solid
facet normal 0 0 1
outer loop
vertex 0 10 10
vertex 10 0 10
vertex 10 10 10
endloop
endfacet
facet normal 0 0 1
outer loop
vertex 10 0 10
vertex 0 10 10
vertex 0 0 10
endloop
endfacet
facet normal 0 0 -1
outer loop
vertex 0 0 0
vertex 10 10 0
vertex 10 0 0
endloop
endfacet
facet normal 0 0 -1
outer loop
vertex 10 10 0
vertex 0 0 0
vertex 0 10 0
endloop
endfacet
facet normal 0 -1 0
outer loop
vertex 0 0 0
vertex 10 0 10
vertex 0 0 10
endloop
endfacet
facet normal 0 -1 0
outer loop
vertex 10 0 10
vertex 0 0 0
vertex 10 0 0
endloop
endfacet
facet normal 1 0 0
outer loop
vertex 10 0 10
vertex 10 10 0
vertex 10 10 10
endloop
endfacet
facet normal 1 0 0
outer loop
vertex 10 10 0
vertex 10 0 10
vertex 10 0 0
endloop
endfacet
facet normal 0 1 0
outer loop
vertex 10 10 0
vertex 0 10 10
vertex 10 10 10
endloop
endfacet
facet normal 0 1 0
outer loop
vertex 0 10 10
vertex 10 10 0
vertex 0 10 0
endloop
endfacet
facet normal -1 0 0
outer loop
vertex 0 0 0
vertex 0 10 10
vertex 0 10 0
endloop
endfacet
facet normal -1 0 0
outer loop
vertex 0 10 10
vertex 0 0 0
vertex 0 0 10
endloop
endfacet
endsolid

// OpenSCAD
//
// Presets: main.json holds this model's Customizer presets; keep it next to this file.

/* [Parameters] */
w = 10;

/* [Hidden] */

// onescad: main.scad

cube(w);
